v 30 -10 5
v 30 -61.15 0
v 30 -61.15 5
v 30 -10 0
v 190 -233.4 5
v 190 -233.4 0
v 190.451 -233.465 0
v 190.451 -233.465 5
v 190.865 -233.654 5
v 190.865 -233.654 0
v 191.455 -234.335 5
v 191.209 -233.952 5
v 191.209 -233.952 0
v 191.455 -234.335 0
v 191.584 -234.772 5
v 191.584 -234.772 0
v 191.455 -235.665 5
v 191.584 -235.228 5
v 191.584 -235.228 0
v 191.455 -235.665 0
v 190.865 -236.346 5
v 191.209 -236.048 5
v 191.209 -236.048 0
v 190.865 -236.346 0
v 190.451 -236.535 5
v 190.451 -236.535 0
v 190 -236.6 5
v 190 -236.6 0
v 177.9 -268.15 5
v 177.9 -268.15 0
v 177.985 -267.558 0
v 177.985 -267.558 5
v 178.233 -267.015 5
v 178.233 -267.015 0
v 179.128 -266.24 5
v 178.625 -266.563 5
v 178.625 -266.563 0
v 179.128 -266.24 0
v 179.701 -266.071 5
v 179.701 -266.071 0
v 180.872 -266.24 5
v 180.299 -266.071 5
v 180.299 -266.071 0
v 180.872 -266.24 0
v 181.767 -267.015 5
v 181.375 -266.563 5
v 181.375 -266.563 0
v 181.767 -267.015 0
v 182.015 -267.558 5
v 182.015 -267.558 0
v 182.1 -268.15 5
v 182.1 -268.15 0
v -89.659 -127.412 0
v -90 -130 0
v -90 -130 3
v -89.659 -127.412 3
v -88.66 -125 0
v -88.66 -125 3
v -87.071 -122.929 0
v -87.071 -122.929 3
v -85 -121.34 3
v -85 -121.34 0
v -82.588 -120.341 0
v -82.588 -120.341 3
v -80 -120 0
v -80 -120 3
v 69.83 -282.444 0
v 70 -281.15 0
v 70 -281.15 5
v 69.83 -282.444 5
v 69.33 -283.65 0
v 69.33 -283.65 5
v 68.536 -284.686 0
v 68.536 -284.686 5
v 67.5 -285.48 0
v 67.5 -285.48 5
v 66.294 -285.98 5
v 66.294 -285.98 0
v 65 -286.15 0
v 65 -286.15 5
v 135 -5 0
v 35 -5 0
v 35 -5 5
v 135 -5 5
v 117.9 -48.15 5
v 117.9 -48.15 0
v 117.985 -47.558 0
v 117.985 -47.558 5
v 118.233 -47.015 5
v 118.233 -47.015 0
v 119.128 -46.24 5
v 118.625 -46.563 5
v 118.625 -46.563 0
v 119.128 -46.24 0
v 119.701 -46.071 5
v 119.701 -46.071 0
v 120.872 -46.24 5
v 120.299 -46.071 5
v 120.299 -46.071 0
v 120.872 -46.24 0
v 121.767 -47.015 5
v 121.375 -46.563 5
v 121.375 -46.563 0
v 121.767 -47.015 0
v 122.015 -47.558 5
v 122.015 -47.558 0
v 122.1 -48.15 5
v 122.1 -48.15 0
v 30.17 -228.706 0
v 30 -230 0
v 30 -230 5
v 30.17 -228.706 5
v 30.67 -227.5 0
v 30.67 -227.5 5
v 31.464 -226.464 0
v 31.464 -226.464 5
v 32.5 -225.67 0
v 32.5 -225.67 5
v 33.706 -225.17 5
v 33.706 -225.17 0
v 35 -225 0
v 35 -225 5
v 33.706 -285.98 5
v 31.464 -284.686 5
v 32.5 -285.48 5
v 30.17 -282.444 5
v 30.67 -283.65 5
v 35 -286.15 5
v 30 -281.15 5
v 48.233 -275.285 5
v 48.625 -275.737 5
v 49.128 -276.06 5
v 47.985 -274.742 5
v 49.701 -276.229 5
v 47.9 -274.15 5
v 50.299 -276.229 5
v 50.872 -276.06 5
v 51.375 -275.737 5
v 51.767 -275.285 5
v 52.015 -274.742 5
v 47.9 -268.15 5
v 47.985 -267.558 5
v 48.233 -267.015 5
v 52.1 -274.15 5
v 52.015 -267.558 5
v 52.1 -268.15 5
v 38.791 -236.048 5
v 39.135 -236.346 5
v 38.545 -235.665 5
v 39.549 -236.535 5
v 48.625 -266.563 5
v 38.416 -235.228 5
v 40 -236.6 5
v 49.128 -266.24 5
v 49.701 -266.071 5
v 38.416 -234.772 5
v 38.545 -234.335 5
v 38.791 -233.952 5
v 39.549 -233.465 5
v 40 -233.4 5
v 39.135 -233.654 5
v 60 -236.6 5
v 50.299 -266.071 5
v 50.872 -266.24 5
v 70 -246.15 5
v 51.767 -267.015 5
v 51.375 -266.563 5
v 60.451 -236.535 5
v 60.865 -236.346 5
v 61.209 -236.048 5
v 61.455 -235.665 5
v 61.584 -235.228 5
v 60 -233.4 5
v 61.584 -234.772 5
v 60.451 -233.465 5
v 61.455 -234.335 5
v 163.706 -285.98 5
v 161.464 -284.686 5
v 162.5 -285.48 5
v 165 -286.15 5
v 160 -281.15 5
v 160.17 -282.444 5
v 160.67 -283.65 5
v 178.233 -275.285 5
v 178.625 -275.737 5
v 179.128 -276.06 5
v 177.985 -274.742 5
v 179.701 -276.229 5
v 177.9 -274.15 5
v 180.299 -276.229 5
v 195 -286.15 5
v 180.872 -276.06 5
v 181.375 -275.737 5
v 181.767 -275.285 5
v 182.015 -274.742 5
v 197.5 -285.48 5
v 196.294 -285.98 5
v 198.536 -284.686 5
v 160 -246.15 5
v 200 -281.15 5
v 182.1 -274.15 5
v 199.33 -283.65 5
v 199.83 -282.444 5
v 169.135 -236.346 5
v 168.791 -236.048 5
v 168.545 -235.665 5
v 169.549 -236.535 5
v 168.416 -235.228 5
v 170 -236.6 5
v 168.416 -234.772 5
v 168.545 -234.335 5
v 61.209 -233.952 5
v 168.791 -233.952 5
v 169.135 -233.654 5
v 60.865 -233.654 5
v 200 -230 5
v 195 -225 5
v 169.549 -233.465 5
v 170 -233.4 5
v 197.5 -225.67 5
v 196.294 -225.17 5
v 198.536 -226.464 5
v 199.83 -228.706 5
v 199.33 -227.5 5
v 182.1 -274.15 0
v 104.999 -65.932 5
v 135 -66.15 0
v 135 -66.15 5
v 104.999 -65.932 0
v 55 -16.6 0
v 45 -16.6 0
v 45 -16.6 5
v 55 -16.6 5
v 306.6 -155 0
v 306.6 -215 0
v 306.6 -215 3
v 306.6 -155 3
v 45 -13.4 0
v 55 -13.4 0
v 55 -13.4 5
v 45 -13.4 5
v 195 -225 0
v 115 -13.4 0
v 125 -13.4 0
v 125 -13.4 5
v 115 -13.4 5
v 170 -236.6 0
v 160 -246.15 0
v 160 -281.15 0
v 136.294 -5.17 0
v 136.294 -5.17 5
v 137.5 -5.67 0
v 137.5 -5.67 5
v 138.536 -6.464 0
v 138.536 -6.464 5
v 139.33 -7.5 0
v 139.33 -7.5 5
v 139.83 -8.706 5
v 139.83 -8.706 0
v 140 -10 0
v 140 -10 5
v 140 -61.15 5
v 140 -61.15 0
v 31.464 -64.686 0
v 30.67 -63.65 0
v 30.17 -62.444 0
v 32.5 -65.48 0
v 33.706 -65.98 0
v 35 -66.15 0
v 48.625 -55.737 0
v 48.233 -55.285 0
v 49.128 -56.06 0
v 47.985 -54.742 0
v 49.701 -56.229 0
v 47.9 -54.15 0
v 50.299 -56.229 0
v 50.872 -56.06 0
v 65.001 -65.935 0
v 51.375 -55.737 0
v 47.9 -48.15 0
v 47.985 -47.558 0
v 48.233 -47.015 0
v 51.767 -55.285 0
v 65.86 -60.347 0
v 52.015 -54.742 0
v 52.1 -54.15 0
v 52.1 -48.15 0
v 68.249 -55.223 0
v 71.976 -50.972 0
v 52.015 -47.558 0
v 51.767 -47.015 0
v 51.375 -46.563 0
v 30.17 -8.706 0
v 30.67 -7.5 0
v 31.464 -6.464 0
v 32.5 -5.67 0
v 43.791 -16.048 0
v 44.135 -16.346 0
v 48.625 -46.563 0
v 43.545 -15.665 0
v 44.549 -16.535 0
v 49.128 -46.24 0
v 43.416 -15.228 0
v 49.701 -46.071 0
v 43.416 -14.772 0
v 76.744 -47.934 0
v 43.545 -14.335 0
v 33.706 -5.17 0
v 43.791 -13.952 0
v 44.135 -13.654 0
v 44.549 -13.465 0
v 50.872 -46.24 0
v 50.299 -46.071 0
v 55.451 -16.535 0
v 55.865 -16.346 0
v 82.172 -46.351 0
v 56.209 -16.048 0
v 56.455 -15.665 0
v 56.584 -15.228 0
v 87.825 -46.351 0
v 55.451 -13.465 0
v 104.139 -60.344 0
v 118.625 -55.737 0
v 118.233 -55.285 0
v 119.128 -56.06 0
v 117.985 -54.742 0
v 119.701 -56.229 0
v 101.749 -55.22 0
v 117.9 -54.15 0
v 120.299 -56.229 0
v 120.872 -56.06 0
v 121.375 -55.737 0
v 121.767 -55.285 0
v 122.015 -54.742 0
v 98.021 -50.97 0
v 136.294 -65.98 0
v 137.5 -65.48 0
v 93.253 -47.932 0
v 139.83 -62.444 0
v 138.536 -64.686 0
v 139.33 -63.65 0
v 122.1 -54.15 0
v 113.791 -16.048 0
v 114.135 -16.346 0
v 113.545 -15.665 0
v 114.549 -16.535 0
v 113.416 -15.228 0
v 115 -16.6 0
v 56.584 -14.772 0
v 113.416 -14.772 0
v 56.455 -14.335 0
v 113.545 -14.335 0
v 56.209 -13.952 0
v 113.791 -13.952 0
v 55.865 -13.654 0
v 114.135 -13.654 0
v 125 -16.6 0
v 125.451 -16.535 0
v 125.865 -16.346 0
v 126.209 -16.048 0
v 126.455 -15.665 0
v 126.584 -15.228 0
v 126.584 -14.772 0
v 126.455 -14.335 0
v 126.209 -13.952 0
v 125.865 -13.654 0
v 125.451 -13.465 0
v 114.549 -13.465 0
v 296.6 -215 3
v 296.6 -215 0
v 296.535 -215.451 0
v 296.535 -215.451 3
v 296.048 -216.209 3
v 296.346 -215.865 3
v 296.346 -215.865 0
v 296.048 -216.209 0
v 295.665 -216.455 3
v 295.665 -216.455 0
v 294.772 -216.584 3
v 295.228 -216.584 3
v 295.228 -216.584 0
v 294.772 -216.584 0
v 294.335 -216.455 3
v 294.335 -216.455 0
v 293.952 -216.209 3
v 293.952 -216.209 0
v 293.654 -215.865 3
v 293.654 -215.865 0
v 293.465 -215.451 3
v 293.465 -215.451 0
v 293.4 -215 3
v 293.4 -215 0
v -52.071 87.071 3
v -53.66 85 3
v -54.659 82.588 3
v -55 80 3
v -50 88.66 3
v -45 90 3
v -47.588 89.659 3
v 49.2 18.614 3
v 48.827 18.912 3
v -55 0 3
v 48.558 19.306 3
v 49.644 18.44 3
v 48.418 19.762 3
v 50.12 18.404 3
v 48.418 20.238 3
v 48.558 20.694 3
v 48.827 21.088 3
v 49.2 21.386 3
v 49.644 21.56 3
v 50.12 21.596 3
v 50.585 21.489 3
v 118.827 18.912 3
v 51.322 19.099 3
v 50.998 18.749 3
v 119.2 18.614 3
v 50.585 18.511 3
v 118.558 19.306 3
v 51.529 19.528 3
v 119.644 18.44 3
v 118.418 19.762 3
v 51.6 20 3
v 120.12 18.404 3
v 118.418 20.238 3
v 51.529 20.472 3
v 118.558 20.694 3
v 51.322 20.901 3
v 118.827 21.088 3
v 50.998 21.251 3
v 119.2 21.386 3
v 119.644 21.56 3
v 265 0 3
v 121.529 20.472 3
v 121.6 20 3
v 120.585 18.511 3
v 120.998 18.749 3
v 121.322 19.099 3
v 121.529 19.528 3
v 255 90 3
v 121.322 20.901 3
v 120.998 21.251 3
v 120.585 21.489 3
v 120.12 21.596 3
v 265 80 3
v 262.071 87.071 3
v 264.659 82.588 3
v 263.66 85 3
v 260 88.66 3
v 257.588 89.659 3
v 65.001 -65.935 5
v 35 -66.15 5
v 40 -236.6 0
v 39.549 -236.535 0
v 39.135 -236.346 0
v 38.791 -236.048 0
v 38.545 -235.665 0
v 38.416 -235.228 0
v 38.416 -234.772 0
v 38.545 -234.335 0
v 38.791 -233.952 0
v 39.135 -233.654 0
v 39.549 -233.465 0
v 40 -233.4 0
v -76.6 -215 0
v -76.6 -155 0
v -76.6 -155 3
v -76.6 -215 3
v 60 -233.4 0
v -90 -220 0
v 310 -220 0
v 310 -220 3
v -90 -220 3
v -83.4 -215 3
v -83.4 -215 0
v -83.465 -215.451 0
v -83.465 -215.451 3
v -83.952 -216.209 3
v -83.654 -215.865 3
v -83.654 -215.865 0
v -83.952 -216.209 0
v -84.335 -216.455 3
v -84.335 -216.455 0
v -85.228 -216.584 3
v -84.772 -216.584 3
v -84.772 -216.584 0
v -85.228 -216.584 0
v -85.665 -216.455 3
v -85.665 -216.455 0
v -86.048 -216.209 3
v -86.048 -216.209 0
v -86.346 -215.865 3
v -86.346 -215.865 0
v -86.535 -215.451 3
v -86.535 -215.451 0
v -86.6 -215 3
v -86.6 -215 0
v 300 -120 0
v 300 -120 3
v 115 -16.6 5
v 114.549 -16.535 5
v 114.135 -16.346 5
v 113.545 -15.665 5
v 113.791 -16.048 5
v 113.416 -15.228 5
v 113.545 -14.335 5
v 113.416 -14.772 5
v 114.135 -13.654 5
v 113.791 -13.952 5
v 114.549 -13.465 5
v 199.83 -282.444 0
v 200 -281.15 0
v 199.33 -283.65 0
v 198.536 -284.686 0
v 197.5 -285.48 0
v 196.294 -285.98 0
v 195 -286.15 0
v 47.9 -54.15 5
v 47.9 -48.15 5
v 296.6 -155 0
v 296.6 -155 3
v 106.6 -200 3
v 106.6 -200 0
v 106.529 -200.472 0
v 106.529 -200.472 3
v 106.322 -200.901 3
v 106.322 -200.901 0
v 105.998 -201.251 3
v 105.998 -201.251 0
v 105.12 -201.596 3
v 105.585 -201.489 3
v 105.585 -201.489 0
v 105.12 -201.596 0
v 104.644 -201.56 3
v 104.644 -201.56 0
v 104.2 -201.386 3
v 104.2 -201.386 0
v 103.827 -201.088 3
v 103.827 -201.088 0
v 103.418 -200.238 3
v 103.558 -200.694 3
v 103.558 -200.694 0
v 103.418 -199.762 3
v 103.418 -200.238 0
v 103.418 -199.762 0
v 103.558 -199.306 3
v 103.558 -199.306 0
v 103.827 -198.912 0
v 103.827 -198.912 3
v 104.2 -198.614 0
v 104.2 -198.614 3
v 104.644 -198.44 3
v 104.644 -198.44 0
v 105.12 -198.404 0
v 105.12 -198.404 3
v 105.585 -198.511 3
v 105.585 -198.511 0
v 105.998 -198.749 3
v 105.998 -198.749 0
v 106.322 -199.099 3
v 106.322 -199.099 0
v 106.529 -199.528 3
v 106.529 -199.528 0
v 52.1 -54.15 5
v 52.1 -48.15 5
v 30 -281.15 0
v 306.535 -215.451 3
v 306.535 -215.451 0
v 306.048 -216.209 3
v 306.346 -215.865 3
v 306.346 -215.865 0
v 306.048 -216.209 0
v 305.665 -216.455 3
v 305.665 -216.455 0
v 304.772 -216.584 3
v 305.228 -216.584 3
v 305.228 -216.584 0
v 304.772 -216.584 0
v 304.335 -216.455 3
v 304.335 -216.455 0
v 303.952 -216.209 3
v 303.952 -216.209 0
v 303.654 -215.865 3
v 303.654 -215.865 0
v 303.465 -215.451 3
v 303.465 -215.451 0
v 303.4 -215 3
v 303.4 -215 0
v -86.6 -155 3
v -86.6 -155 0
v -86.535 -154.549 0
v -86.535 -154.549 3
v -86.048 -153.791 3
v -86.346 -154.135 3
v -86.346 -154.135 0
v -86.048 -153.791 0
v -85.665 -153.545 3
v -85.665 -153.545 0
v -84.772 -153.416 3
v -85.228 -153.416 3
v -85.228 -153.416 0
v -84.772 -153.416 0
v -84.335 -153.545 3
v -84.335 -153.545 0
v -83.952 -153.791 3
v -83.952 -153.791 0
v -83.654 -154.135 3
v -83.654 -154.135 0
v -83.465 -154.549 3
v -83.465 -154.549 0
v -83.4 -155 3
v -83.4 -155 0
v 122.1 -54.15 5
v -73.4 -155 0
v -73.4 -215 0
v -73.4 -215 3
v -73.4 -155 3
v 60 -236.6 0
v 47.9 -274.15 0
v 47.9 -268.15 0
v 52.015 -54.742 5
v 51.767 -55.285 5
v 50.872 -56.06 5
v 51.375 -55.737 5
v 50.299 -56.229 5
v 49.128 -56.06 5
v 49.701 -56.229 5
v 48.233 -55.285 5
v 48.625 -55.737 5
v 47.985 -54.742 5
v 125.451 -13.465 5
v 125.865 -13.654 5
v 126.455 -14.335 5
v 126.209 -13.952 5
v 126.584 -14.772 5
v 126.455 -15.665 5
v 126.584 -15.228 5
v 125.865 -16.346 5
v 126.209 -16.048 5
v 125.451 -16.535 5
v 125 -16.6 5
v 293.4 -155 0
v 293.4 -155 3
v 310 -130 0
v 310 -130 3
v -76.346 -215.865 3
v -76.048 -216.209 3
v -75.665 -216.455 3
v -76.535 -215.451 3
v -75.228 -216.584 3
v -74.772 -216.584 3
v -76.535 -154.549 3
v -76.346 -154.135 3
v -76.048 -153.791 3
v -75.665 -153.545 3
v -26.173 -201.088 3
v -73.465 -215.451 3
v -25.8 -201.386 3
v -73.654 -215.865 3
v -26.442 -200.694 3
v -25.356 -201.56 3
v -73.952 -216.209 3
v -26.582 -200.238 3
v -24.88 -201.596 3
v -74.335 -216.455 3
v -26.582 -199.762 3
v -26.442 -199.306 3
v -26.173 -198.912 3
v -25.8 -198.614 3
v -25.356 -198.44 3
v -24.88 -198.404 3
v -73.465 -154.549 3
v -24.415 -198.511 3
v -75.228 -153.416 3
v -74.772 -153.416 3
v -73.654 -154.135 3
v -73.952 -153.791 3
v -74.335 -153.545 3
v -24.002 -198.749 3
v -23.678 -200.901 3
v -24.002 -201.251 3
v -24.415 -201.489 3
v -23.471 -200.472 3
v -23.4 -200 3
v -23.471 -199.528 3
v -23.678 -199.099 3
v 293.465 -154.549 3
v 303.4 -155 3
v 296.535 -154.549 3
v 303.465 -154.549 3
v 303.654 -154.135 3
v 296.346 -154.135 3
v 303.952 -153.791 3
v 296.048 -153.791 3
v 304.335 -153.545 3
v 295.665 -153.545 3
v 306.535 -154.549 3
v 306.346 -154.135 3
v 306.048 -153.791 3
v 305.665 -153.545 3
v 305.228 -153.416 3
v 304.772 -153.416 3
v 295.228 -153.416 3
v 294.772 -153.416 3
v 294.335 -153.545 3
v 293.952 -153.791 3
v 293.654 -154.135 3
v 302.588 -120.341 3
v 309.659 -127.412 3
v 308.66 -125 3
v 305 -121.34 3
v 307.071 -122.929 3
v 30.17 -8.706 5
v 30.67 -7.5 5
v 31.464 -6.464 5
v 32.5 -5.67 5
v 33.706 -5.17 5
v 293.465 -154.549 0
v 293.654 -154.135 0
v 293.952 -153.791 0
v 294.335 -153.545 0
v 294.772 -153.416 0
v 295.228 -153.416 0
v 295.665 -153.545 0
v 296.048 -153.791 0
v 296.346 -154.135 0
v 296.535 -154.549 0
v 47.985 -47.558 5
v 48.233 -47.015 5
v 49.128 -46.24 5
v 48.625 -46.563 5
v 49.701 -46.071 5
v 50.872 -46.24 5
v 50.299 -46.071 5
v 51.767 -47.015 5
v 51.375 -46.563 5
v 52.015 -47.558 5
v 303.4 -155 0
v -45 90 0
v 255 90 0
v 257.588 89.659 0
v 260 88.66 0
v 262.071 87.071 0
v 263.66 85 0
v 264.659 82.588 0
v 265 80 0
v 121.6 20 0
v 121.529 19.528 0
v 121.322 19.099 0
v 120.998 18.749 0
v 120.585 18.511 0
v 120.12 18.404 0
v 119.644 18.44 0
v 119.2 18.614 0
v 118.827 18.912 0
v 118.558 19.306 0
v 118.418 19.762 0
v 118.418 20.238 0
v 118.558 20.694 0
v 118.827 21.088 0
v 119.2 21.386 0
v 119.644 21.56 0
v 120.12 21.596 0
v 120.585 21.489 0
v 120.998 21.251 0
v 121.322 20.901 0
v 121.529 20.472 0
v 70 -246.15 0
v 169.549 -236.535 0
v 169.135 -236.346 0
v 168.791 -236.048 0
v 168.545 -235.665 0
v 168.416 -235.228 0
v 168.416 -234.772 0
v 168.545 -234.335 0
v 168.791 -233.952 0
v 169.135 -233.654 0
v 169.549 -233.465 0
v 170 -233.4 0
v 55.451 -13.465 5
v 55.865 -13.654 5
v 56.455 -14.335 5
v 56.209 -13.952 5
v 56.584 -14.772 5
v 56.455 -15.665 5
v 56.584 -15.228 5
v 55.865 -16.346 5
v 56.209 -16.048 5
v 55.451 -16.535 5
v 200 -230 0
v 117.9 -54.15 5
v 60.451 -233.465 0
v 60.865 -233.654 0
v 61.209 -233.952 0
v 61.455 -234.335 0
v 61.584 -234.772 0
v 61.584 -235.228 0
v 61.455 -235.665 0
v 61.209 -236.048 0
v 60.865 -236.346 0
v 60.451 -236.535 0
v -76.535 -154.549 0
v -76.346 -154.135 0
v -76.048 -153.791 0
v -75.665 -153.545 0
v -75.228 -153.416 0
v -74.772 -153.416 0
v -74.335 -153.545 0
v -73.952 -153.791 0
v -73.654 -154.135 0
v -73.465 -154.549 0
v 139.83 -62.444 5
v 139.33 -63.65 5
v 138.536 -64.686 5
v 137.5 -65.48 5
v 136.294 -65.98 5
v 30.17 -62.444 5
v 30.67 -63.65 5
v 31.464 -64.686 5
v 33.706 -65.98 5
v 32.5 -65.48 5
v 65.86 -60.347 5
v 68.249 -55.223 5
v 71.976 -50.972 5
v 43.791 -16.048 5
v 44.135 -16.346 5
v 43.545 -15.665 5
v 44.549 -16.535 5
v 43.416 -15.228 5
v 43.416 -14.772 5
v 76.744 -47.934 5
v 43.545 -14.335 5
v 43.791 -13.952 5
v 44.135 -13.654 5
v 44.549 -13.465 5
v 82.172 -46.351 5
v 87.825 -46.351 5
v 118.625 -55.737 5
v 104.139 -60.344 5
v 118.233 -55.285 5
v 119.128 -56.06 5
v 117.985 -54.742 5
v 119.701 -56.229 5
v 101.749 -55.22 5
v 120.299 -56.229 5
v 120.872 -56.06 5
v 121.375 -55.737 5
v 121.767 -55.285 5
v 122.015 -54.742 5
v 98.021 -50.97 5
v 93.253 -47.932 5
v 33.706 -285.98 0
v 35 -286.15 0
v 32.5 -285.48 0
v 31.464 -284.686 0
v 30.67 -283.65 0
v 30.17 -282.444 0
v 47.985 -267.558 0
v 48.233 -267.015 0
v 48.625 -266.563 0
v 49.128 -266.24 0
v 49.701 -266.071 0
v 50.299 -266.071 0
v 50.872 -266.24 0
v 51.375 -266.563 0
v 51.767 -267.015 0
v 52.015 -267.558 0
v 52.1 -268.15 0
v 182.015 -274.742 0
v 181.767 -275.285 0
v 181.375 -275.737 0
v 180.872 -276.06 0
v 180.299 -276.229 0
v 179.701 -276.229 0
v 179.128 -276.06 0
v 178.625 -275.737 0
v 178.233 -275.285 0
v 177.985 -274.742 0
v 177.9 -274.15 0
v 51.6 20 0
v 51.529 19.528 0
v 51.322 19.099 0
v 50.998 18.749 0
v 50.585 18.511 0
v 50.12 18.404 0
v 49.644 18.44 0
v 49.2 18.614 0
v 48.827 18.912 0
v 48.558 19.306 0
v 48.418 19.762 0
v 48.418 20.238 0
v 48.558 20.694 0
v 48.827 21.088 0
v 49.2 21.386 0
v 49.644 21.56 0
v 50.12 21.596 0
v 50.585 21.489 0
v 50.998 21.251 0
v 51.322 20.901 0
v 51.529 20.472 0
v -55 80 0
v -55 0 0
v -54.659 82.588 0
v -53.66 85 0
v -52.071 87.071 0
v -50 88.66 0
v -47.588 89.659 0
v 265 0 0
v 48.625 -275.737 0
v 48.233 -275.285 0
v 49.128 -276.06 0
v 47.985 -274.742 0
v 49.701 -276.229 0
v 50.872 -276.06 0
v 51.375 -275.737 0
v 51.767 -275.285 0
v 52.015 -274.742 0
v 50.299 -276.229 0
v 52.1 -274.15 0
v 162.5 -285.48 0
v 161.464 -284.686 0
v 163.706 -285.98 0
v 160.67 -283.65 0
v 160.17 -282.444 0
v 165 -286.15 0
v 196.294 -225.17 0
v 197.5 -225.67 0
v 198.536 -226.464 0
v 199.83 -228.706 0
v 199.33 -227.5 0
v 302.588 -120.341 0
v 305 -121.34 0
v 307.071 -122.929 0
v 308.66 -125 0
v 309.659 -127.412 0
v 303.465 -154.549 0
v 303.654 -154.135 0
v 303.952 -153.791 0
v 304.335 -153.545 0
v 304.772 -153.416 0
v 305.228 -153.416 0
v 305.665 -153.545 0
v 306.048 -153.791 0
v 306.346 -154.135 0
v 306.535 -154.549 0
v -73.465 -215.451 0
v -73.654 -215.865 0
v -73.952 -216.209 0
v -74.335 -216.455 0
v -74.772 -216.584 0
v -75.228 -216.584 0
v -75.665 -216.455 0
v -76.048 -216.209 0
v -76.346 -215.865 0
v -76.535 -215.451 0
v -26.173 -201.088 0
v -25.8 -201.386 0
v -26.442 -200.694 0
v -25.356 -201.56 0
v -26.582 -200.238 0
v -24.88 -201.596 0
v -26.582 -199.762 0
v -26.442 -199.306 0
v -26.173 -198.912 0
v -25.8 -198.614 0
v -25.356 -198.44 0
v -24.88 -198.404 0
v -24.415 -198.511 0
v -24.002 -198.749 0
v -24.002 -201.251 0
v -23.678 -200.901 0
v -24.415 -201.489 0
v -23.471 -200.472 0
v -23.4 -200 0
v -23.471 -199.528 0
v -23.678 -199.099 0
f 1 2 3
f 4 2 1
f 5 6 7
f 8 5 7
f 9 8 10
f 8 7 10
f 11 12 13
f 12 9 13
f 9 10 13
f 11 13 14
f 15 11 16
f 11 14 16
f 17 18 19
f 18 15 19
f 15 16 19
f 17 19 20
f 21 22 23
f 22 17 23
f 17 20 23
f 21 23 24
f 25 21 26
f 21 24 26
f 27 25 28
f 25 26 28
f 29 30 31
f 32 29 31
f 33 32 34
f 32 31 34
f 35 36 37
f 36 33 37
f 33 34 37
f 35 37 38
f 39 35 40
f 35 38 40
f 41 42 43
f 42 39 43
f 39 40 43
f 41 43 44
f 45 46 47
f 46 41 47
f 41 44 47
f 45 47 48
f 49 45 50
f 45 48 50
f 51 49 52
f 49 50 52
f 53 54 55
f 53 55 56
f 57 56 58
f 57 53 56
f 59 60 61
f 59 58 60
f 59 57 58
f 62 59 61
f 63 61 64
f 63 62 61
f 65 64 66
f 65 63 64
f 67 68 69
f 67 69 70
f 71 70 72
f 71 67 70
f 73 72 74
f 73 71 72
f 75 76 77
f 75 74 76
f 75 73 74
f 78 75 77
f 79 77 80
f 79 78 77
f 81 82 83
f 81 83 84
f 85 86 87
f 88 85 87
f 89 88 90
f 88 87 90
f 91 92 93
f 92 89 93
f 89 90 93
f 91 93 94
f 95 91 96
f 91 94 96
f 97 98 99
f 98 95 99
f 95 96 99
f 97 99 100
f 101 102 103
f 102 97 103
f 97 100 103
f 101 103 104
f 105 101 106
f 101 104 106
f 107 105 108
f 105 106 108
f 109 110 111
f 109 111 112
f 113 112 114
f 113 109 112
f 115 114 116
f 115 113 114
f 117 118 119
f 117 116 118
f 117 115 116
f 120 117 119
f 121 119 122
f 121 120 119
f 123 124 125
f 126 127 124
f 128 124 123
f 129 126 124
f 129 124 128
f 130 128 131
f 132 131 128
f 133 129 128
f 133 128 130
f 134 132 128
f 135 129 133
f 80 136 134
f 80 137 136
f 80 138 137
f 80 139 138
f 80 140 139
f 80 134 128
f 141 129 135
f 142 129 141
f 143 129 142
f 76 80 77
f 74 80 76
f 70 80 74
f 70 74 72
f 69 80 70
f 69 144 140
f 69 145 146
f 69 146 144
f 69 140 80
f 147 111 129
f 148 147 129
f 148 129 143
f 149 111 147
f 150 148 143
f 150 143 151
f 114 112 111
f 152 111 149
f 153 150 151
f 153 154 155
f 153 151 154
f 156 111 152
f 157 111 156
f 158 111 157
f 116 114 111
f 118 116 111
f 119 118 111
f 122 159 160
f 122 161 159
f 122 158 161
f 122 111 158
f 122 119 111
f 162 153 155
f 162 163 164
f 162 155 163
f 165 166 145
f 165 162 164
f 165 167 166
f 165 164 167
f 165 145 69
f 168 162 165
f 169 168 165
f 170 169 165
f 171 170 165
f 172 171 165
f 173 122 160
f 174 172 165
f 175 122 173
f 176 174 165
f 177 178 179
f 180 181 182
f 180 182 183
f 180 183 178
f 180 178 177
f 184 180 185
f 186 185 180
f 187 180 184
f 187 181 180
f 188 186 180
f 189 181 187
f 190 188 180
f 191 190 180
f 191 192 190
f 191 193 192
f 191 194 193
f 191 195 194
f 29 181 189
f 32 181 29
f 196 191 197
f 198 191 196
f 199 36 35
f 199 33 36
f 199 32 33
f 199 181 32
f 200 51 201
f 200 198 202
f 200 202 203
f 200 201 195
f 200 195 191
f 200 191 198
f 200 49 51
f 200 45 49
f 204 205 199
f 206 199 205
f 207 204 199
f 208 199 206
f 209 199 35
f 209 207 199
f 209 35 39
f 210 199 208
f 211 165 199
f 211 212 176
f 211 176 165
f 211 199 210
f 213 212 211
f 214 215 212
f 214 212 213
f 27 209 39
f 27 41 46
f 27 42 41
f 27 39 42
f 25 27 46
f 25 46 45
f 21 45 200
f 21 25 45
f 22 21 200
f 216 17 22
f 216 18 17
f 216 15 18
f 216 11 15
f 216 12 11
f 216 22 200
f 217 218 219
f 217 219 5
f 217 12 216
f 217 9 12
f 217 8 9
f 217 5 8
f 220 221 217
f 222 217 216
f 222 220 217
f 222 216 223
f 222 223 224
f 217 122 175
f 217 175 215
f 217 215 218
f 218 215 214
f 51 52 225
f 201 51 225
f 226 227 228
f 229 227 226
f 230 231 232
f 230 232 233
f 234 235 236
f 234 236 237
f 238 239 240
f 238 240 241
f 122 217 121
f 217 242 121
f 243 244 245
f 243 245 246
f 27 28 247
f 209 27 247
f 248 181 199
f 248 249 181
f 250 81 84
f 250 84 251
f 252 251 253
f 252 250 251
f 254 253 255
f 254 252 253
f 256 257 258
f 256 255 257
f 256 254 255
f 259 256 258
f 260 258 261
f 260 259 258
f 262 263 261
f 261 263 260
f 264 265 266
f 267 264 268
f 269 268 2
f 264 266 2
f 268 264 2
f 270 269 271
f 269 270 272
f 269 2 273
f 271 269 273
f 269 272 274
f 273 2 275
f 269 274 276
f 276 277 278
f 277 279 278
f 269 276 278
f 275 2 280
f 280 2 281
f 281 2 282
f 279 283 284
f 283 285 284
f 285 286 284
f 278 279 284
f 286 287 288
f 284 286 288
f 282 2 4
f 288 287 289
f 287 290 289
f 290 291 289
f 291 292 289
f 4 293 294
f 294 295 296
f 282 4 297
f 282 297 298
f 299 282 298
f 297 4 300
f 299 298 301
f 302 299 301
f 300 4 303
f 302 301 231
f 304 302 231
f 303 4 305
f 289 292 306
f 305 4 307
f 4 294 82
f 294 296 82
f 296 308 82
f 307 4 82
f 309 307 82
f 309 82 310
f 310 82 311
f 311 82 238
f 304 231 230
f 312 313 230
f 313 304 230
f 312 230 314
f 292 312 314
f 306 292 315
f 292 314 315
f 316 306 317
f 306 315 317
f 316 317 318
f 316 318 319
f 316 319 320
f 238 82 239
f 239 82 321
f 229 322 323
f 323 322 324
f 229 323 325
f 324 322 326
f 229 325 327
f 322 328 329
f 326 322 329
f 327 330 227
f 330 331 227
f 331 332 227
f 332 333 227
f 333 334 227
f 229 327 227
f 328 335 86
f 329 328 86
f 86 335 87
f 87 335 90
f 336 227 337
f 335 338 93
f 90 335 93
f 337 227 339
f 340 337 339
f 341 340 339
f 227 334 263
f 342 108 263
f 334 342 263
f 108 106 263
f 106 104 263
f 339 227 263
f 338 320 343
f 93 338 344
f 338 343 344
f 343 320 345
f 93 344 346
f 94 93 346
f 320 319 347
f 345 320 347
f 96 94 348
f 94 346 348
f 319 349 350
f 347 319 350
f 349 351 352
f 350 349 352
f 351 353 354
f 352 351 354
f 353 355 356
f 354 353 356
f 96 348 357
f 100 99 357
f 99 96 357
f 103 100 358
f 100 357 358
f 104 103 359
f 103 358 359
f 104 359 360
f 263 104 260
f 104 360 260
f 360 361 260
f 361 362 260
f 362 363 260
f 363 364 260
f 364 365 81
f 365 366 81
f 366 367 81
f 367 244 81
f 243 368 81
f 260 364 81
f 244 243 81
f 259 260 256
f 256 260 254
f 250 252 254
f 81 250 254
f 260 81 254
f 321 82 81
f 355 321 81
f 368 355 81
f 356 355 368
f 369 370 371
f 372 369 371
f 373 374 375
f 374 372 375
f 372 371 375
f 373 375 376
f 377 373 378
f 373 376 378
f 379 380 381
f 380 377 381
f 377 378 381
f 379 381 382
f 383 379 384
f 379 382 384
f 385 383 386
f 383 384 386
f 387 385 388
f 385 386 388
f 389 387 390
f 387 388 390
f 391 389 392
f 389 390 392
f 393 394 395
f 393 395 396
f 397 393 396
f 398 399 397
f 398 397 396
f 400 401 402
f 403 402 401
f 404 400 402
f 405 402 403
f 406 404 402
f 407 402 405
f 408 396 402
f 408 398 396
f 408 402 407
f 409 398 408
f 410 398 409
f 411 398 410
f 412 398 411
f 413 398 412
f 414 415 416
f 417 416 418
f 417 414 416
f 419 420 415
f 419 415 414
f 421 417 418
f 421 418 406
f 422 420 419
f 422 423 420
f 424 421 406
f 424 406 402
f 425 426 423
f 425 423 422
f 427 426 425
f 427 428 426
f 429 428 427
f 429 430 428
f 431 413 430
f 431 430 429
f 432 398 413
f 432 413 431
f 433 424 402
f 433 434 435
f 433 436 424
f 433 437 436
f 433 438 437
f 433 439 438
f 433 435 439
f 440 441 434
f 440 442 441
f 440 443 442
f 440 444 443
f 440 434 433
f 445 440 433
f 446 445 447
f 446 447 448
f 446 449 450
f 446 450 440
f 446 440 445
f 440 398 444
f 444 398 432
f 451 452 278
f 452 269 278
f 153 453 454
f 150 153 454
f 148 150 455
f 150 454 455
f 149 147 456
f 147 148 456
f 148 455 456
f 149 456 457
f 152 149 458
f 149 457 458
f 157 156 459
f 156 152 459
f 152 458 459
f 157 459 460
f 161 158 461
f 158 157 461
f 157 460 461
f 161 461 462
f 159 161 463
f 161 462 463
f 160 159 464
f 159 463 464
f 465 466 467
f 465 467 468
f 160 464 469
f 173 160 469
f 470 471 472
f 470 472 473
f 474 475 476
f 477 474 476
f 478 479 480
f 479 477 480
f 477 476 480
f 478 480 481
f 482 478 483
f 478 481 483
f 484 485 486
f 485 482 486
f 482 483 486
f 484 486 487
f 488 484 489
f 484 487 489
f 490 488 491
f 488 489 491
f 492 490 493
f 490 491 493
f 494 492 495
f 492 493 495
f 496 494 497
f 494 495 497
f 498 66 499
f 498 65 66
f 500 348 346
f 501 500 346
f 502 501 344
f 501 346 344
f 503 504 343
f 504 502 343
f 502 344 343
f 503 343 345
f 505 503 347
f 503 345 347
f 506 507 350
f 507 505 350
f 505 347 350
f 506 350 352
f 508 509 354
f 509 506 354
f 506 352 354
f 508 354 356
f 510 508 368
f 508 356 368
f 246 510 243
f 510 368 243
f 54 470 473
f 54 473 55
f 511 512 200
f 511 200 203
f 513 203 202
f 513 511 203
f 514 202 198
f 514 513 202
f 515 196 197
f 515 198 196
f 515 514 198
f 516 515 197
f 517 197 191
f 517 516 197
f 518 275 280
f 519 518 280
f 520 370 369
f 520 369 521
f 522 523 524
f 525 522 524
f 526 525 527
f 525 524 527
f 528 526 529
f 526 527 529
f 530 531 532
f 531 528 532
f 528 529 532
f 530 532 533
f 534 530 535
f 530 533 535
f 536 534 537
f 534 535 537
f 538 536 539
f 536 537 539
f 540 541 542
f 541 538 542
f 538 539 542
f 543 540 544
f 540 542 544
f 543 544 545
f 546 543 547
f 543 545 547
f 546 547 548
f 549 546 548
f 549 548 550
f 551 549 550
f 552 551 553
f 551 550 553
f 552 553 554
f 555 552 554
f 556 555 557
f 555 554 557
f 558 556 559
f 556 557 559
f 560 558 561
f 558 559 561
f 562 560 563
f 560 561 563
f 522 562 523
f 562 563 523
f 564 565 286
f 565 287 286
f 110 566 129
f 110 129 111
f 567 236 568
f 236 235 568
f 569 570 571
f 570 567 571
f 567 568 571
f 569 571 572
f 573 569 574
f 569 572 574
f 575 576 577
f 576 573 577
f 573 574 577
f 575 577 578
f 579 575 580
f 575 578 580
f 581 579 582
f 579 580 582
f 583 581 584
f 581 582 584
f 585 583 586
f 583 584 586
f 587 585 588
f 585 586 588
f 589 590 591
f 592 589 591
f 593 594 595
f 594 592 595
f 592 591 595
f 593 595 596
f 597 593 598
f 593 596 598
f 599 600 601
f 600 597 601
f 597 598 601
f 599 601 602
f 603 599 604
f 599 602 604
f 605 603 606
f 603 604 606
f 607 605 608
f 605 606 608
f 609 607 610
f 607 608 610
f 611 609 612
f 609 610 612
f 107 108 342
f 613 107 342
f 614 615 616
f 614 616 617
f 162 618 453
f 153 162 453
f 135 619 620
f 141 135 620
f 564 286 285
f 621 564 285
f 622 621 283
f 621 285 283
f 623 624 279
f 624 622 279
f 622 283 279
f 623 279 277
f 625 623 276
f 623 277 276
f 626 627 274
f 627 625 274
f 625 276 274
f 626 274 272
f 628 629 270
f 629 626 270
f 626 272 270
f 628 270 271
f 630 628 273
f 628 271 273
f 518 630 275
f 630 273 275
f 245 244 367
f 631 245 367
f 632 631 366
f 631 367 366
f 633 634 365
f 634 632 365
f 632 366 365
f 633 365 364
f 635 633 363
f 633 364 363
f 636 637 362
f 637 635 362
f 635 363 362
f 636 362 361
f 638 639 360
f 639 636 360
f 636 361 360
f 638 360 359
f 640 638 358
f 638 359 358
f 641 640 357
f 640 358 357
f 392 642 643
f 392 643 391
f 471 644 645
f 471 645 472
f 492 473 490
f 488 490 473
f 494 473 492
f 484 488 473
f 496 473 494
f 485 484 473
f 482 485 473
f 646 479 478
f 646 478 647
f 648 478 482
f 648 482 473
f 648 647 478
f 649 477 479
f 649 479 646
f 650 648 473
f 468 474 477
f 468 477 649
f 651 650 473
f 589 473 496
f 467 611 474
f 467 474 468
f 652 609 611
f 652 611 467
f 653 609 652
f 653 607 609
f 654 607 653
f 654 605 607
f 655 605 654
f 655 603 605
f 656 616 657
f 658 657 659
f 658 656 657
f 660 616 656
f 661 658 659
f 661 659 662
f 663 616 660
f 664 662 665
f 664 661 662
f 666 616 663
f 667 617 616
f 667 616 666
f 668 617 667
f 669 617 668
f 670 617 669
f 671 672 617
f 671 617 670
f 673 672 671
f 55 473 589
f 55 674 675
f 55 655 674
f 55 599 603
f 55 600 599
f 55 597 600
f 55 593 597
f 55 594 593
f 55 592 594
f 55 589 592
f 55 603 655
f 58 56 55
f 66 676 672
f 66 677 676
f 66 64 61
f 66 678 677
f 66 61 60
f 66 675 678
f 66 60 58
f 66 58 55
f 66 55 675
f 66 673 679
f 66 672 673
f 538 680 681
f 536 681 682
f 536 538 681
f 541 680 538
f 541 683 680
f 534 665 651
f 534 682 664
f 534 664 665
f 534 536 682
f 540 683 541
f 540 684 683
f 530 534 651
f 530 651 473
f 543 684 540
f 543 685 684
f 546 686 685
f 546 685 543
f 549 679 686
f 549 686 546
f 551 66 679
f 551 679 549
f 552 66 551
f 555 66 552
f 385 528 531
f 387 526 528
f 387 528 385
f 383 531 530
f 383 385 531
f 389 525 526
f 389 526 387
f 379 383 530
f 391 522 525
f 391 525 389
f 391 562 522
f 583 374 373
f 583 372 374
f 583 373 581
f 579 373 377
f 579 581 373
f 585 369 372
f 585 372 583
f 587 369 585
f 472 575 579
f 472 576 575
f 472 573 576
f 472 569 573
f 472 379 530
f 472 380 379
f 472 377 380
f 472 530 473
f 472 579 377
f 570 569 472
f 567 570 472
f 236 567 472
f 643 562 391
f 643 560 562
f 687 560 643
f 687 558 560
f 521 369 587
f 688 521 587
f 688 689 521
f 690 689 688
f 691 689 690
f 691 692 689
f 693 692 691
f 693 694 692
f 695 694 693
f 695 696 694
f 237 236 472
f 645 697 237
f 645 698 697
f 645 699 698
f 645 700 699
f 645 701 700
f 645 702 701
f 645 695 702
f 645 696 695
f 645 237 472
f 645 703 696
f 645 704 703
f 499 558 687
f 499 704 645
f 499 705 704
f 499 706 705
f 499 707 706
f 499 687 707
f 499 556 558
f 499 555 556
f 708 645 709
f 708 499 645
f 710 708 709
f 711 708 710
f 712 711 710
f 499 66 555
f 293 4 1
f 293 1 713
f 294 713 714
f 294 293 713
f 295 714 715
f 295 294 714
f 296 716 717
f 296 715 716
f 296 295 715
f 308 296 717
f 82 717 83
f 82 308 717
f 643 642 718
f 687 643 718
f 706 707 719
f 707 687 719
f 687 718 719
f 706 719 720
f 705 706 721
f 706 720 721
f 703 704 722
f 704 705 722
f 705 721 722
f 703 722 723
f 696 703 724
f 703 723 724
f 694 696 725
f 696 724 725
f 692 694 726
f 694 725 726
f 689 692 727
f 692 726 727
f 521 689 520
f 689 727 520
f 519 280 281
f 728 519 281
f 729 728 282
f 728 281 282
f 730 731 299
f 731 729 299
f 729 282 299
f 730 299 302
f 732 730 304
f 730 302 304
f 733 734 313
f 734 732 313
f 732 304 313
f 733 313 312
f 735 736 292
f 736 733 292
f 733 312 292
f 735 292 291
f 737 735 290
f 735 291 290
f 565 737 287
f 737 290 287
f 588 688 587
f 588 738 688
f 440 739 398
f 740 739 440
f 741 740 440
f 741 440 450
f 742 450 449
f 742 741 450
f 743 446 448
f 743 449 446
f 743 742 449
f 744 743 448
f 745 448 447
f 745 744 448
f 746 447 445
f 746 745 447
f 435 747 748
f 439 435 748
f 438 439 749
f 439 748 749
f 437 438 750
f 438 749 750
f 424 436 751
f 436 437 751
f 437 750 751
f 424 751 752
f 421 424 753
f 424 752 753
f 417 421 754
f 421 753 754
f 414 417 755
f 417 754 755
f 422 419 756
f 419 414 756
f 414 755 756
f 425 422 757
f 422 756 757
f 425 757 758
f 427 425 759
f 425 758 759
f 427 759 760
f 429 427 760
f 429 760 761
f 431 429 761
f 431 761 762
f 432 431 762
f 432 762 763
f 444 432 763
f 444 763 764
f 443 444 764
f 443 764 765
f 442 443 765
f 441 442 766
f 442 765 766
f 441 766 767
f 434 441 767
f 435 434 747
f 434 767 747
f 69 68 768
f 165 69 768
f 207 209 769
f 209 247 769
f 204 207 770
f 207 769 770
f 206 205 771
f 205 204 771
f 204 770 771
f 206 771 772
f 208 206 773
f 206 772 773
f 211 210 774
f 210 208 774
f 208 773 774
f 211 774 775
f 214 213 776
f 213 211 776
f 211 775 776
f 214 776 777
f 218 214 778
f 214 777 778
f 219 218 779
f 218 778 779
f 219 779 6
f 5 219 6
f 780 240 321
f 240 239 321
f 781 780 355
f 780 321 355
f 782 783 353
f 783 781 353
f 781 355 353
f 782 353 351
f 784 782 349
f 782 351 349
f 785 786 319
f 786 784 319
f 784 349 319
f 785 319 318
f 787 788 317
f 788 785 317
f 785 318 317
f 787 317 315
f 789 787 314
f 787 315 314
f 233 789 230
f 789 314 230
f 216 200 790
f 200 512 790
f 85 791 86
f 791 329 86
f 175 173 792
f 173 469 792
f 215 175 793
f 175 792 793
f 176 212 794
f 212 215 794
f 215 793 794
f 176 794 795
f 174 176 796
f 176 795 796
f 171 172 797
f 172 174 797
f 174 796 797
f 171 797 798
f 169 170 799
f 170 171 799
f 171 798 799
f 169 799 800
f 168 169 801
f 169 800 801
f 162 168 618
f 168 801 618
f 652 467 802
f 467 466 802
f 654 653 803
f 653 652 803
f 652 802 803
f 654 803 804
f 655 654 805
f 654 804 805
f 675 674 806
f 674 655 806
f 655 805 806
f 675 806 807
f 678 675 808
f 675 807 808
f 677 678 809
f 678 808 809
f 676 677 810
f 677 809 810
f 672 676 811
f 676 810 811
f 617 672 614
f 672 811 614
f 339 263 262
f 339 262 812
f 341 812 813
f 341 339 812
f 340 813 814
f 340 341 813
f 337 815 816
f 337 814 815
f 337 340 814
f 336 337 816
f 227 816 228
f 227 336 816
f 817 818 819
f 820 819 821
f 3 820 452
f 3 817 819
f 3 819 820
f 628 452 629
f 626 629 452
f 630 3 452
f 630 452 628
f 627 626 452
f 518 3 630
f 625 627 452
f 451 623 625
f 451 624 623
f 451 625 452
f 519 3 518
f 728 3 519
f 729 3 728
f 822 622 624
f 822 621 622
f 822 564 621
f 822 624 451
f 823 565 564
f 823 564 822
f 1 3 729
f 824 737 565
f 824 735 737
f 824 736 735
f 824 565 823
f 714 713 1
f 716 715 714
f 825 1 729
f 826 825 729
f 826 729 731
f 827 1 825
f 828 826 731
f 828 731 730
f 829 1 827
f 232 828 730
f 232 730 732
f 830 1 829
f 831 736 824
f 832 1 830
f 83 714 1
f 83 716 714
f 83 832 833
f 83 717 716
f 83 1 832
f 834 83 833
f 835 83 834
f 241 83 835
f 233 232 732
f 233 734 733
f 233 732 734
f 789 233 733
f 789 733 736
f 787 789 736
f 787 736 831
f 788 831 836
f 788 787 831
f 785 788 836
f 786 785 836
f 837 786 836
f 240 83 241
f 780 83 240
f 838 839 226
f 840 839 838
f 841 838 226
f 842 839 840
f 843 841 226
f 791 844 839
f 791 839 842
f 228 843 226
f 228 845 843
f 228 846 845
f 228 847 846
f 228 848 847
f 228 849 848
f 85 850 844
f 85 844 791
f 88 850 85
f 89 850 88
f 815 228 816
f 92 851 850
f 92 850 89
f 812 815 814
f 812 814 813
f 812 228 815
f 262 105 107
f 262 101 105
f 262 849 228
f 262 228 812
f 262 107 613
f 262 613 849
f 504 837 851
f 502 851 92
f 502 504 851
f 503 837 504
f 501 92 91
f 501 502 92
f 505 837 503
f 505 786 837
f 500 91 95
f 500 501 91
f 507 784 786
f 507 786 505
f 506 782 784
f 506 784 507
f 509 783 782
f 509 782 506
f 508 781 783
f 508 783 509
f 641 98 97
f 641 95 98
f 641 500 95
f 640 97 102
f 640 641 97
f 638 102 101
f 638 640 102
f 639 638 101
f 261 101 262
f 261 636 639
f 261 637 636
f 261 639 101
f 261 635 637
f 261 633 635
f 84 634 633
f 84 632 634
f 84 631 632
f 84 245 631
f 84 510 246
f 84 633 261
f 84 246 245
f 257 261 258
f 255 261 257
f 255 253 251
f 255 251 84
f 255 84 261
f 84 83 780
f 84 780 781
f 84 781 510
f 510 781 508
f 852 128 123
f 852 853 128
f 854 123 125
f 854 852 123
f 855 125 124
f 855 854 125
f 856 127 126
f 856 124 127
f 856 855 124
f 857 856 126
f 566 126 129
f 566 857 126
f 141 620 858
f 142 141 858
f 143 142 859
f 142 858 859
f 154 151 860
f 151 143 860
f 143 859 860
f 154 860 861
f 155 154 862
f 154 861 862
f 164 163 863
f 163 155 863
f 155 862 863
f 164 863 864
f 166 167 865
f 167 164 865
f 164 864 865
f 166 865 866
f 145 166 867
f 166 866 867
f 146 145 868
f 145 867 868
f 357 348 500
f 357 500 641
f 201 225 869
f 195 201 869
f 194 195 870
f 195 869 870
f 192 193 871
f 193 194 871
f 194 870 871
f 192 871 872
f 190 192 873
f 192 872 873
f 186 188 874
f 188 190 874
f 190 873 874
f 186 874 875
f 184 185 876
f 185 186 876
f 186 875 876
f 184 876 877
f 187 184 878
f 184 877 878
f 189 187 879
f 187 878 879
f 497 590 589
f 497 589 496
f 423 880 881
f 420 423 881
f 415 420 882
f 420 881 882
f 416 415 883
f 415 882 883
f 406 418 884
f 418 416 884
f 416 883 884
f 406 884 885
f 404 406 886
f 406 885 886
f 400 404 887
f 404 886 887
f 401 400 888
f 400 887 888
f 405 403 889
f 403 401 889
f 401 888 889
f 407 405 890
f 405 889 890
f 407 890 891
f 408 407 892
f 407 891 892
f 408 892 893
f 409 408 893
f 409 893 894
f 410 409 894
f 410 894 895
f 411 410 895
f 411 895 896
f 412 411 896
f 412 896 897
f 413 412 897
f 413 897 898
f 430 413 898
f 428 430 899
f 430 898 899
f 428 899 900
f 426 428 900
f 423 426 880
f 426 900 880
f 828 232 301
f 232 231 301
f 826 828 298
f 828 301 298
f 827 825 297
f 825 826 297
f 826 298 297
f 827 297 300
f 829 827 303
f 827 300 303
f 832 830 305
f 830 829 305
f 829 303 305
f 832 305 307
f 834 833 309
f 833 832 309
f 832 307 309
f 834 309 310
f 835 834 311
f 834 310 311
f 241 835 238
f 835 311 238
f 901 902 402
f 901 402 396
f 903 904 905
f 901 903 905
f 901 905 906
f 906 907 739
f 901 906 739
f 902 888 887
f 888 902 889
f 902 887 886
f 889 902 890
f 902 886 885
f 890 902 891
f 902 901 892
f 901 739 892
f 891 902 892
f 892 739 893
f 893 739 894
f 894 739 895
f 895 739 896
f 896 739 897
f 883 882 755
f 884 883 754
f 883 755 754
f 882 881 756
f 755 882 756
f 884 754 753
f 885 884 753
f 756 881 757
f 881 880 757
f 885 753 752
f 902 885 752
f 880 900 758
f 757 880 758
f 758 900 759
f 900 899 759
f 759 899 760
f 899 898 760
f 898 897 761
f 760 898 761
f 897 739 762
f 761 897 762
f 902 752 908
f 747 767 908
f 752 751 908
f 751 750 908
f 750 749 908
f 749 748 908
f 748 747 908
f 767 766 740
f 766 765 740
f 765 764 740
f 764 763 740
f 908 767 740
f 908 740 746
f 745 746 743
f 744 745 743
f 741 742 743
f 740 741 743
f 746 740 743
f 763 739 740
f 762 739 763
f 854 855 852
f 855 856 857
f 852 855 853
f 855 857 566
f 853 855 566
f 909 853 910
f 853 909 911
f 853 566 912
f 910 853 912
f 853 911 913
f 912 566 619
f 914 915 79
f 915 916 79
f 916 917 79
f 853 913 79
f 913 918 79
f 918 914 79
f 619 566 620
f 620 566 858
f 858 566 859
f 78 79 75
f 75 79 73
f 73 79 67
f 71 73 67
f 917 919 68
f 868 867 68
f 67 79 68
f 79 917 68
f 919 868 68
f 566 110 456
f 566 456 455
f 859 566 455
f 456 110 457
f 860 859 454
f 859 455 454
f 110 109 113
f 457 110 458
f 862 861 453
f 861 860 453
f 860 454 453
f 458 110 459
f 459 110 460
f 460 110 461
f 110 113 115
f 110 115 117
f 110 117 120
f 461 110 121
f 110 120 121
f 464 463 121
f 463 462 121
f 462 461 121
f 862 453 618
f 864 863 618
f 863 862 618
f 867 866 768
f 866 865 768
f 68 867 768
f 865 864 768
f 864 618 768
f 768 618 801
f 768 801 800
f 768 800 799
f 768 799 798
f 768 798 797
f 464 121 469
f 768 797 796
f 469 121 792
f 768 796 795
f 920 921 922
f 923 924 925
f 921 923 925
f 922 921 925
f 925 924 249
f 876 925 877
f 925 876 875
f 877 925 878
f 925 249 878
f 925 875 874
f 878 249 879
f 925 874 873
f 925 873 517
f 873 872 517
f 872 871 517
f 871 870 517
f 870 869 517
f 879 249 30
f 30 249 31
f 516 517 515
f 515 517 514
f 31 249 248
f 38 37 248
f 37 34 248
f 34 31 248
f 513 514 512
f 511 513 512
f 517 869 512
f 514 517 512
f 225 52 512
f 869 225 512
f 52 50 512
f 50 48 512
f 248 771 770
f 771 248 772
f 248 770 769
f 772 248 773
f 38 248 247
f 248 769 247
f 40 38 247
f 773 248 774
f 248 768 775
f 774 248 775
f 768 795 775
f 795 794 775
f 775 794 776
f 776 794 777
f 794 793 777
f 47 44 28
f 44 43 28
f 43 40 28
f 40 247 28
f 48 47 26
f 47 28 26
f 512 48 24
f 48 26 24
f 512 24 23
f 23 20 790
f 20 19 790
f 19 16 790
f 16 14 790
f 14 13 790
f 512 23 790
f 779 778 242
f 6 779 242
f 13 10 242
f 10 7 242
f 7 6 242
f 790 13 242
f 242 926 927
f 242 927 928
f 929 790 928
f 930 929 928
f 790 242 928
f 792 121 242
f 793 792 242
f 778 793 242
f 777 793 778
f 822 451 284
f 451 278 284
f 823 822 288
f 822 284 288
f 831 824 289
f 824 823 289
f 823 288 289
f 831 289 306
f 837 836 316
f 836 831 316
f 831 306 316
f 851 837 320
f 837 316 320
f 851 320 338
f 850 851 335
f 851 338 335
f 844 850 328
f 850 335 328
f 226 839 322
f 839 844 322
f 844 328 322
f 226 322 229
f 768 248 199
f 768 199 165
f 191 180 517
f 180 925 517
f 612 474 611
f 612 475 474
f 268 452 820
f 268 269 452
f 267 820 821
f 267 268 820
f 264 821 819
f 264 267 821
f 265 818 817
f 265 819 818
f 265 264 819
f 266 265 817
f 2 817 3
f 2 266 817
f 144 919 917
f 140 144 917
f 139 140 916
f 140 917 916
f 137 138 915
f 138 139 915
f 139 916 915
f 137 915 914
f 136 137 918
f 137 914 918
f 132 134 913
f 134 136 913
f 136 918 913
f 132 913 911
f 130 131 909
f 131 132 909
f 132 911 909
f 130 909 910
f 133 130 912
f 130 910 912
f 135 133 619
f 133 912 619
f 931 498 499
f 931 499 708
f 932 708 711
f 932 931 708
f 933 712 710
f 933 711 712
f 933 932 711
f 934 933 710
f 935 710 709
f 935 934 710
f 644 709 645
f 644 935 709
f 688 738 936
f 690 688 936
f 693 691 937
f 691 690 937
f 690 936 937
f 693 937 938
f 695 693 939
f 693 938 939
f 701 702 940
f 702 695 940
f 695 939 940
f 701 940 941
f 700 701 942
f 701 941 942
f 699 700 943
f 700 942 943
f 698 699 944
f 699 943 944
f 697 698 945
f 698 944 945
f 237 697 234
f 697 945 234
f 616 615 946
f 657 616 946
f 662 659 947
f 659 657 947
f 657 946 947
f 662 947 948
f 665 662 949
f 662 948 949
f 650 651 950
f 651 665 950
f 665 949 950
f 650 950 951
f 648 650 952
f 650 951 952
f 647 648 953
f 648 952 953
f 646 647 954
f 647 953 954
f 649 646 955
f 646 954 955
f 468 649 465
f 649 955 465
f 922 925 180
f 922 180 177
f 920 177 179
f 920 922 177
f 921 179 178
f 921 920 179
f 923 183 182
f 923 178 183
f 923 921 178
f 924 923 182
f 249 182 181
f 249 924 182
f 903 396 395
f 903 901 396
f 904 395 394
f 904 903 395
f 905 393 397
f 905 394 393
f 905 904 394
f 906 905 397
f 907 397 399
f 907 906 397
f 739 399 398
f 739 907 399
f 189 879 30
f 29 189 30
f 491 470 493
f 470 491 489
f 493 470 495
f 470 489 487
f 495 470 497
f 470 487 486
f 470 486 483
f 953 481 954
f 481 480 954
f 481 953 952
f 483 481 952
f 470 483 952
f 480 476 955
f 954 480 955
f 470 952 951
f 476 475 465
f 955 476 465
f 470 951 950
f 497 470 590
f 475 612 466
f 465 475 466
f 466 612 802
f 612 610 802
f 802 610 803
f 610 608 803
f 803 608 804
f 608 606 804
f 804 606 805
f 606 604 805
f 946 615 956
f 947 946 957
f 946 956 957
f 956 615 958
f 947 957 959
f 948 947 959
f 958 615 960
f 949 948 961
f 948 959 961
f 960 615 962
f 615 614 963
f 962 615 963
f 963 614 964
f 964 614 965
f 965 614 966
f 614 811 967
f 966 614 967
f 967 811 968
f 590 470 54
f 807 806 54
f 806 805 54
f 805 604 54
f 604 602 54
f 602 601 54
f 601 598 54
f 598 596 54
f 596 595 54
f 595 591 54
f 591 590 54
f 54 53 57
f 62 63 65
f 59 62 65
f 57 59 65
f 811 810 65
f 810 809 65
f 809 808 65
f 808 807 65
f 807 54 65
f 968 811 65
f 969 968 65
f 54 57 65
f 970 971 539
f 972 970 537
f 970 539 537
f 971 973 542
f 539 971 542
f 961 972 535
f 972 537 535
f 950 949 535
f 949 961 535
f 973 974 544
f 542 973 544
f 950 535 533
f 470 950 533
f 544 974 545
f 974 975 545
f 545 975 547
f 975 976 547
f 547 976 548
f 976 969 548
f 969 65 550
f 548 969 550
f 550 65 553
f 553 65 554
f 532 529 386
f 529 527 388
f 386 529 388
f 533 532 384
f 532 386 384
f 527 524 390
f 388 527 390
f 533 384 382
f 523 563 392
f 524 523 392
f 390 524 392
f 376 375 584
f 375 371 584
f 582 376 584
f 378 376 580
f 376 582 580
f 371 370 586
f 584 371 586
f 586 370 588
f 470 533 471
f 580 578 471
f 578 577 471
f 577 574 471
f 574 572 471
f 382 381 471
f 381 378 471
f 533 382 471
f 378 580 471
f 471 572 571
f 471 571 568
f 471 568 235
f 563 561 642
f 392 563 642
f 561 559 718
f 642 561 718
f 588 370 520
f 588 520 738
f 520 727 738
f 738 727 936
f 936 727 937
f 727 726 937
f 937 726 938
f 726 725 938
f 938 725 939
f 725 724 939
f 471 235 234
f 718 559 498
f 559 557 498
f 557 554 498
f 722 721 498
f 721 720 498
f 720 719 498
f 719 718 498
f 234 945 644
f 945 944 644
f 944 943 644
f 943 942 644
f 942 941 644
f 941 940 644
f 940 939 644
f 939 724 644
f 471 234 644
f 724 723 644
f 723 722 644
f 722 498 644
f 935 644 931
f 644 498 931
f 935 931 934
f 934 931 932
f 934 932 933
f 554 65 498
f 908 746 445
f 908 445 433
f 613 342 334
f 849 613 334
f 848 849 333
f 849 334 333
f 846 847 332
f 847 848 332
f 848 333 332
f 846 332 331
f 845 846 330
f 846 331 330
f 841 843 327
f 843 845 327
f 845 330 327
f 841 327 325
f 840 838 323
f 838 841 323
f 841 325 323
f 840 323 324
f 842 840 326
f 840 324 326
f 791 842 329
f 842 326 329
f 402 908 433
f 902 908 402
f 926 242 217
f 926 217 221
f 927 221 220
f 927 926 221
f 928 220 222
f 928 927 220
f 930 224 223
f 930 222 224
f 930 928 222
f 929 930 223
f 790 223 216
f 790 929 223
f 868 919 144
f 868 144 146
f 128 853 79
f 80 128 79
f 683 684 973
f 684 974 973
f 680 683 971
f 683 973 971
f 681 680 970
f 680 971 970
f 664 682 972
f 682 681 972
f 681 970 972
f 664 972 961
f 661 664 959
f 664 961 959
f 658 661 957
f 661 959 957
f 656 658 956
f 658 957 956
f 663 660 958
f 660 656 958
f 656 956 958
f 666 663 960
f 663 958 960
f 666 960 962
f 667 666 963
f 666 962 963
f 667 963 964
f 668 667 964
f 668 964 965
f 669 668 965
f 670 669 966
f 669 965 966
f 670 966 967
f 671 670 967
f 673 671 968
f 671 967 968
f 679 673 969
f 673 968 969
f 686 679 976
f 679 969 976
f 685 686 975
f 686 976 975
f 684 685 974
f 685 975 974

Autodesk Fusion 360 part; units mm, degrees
sketch "Sketch3" plane through (0, 0, 0) normal (0, 0, 1) x (1, 0, 0) in component "Short wall"
  line L0 (125, -13.4) -> (115, -13.4)
  line L1 (115, -16.6) -> (125, -16.6)
  arc A0 (125, -16.6) -> (125, -13.4) centre (125, -15) ccw
  arc A1 (115, -13.4) -> (115, -16.6) centre (115, -15) ccw
  line L2 (55, -13.4) -> (45, -13.4)
  arc A2 (45, -13.4) -> (45, -16.6) centre (45, -15) ccw
  line L3 (45, -16.6) -> (55, -16.6)
  arc A3 (55, -16.6) -> (55, -13.4) centre (55, -15) ccw
  line L4 (52.1, -48.15) -> (52.1, -54.15)
  line L5 (47.9, -54.15) -> (47.9, -48.15)
  arc A4 (52.1, -48.15) -> (47.9, -48.15) centre (50, -48.15) ccw
  arc A5 (47.9, -54.15) -> (52.1, -54.15) centre (50, -54.15) ccw
  arc A6 (122.1, -48.15) -> (117.9, -48.15) centre (120, -48.15) ccw
  line L6 (122.1, -48.15) -> (122.1, -54.15)
  arc A7 (117.9, -54.15) -> (122.1, -54.15) centre (120, -54.15) ccw
  line L7 (117.9, -54.15) -> (117.9, -48.15)
  arc A8 (104.9988, -65.9318) -> (65.0012, -65.935) centre (85, -66.15) ccw
  arc A9 (140, -10) -> (135, -5) centre (135, -10) ccw
  arc A10 (135, -66.15) -> (140, -61.15) centre (135, -61.15) ccw
  arc A11 (30, -61.15) -> (35, -66.15) centre (35, -61.15) ccw
  arc A12 (35, -5) -> (30, -10) centre (35, -10) ccw
  line L8 (30, -61.15) -> (30, -10)
  line L9 (35, -66.15) -> (65.0012, -65.935)
  line L10 (35, -5) -> (135, -5)
  line L11 (140, -61.15) -> (140, -10)
  line L12 (135, -66.15) -> (104.9988, -65.9318)
  dimension "d9" = 10
  dimension "d10" = 3.2
  dimension "d11" = 10
  dimension "d12" = 3.2
  dimension "d21" = 20
sketch "Sketch1" plane through (0, 0, 0) normal (0, 0, 1) x (1, 0, 0) in component "Short wall"
  circle A0 centre (50, 20) radius 1.6
  circle A1 centre (120, 20) radius 1.6
  line L0 (265, 0) -> (-55, 0)
  line L1 (-55, 0) -> (-55, 80)
  line L2 (-45, 90) -> (255, 90)
  line L3 (265, 80) -> (265, 0)
  arc A2 (-45, 90) -> (-55, 80) centre (-45, 80) ccw
  arc A3 (265, 80) -> (255, 90) centre (255, 80) ccw
  dimension "d3" = 3.2
  dimension "d4" = 3.2
  dimension "d69" = 320
  dimension "d70" = 10
  dimension "d71" = 10
sketch "Sketch4" plane through (0, 0, 0) normal (0, 0, 1) x (1, 0, 0) in component "Long wall"
  arc A0 (190, -236.6) -> (190, -233.4) centre (190, -235) ccw
  line L0 (177.9, -274.15) -> (177.9, -268.15)
  arc A1 (170, -233.4) -> (170, -236.6) centre (170, -235) ccw
  arc A2 (182.1, -268.15) -> (177.9, -268.15) centre (180, -268.15) ccw
  arc A3 (60, -236.6) -> (60, -233.4) centre (60, -235) ccw
  arc A4 (40, -233.4) -> (40, -236.6) centre (40, -235) ccw
  arc A5 (177.9, -274.15) -> (182.1, -274.15) centre (180, -274.15) ccw
  arc A6 (52.1, -268.15) -> (47.9, -268.15) centre (50, -268.15) ccw
  line L1 (47.9, -274.15) -> (47.9, -268.15)
  arc A7 (47.9, -274.15) -> (52.1, -274.15) centre (50, -274.15) ccw
  line L2 (160, -246.15) -> (70, -246.15)
  line L3 (170, -233.4) -> (190, -233.4)
  line L4 (190, -236.6) -> (170, -236.6)
  line L5 (40, -233.4) -> (60, -233.4)
  line L6 (60, -236.6) -> (40, -236.6)
  arc A8 (200, -230) -> (195, -225) centre (195, -230) ccw
  arc A9 (195, -286.15) -> (200, -281.15) centre (195, -281.15) ccw
  arc A10 (160, -281.15) -> (165, -286.15) centre (165, -281.15) ccw
  arc A11 (65, -286.15) -> (70, -281.15) centre (65, -281.15) ccw
  arc A12 (30, -281.15) -> (35, -286.15) centre (35, -281.15) ccw
  arc A13 (35, -225) -> (30, -230) centre (35, -230) ccw
  line L7 (30, -281.15) -> (30, -230)
  line L8 (35, -286.15) -> (65, -286.15)
  line L9 (70, -281.15) -> (70, -246.15)
  line L10 (160, -281.15) -> (160, -246.15)
  line L11 (165, -286.15) -> (195, -286.15)
  line L12 (200, -281.15) -> (200, -230)
  line L13 (195, -225) -> (35, -225)
  line L14 (182.1, -268.15) -> (182.1, -274.15)
  line L15 (52.1, -274.15) -> (52.1, -268.15)
  dimension "d23" = 3.2
  dimension "d25" = 3.2
sketch "Sketch2" plane through (0, 0, 0) normal (0, 0, 1) x (1, 0, 0) in component "Long wall"
  circle A0 centre (105, -200) radius 1.6
  circle A1 centre (-25, -200) radius 1.6
  line L0 (310, -220) -> (-90, -220)
  line L1 (-90, -220) -> (-90, -130)
  line L2 (-80, -120) -> (300, -120)
  line L3 (310, -130) -> (310, -220)
  arc A2 (310, -130) -> (300, -120) centre (300, -130) ccw
  arc A3 (-80, -120) -> (-90, -130) centre (-80, -130) ccw
  line L4 (303.4, -155) -> (303.4, -215)
  arc A4 (303.4, -215) -> (306.6, -215) centre (305, -215) ccw
  line L5 (306.6, -215) -> (306.6, -155)
  arc A5 (306.6, -155) -> (303.4, -155) centre (305, -155) ccw
  line L6 (305, -155) -> (305, -215) construction
  line L7 (293.4, -155) -> (293.4, -215)
  arc A6 (293.4, -215) -> (296.6, -215) centre (295, -215) ccw
  line L8 (296.6, -215) -> (296.6, -155)
  arc A7 (296.6, -155) -> (293.4, -155) centre (295, -155) ccw
  line L9 (295, -155) -> (295, -215) construction
  line L10 (-76.6, -155) -> (-76.6, -215)
  arc A8 (-76.6, -215) -> (-73.4, -215) centre (-75, -215) ccw
  line L11 (-73.4, -215) -> (-73.4, -155)
  arc A9 (-73.4, -155) -> (-76.6, -155) centre (-75, -155) ccw
  line L12 (-75, -155) -> (-75, -215) construction
  line L13 (-86.6, -155) -> (-86.6, -215)
  arc A10 (-86.6, -215) -> (-83.4, -215) centre (-85, -215) ccw
  line L14 (-83.4, -215) -> (-83.4, -155)
  arc A11 (-83.4, -155) -> (-86.6, -155) centre (-85, -155) ccw
  line L15 (-85, -155) -> (-85, -215) construction
  point P0 (305, -185)
  point P1 (295, -185)
  point P2 (-75, -185)
  point P3 (-85, -185)
  dimension "d7" = 3.2
  dimension "d8" = 3.2
  dimension "d65" = 10
  dimension "d66" = 10
extrude "Extrude1" add sketch "Sketch2" along normal blind 3 makes body 1 in component "Long wall"
extrude "Extrude2" add sketch "Sketch4" along normal blind 5 separate body makes body 2 in component "Long wall"
extrude "Extrude1'" add sketch "Sketch1" along normal blind 3 separate body makes body 3 in component "Short wall"
extrude "Extrude2'" add sketch "Sketch3" along normal blind 5 separate body makes body 4 in component "Short wall"
component "Short wall" placed x (1, 0, 0) y (0, 1, 0) z (0, 0, 1) at (0, 0, 0)
component "Long wall" placed x (1, 0, 0) y (0, 1, 0) z (0, 0, 1) at (0, 0, 0)
